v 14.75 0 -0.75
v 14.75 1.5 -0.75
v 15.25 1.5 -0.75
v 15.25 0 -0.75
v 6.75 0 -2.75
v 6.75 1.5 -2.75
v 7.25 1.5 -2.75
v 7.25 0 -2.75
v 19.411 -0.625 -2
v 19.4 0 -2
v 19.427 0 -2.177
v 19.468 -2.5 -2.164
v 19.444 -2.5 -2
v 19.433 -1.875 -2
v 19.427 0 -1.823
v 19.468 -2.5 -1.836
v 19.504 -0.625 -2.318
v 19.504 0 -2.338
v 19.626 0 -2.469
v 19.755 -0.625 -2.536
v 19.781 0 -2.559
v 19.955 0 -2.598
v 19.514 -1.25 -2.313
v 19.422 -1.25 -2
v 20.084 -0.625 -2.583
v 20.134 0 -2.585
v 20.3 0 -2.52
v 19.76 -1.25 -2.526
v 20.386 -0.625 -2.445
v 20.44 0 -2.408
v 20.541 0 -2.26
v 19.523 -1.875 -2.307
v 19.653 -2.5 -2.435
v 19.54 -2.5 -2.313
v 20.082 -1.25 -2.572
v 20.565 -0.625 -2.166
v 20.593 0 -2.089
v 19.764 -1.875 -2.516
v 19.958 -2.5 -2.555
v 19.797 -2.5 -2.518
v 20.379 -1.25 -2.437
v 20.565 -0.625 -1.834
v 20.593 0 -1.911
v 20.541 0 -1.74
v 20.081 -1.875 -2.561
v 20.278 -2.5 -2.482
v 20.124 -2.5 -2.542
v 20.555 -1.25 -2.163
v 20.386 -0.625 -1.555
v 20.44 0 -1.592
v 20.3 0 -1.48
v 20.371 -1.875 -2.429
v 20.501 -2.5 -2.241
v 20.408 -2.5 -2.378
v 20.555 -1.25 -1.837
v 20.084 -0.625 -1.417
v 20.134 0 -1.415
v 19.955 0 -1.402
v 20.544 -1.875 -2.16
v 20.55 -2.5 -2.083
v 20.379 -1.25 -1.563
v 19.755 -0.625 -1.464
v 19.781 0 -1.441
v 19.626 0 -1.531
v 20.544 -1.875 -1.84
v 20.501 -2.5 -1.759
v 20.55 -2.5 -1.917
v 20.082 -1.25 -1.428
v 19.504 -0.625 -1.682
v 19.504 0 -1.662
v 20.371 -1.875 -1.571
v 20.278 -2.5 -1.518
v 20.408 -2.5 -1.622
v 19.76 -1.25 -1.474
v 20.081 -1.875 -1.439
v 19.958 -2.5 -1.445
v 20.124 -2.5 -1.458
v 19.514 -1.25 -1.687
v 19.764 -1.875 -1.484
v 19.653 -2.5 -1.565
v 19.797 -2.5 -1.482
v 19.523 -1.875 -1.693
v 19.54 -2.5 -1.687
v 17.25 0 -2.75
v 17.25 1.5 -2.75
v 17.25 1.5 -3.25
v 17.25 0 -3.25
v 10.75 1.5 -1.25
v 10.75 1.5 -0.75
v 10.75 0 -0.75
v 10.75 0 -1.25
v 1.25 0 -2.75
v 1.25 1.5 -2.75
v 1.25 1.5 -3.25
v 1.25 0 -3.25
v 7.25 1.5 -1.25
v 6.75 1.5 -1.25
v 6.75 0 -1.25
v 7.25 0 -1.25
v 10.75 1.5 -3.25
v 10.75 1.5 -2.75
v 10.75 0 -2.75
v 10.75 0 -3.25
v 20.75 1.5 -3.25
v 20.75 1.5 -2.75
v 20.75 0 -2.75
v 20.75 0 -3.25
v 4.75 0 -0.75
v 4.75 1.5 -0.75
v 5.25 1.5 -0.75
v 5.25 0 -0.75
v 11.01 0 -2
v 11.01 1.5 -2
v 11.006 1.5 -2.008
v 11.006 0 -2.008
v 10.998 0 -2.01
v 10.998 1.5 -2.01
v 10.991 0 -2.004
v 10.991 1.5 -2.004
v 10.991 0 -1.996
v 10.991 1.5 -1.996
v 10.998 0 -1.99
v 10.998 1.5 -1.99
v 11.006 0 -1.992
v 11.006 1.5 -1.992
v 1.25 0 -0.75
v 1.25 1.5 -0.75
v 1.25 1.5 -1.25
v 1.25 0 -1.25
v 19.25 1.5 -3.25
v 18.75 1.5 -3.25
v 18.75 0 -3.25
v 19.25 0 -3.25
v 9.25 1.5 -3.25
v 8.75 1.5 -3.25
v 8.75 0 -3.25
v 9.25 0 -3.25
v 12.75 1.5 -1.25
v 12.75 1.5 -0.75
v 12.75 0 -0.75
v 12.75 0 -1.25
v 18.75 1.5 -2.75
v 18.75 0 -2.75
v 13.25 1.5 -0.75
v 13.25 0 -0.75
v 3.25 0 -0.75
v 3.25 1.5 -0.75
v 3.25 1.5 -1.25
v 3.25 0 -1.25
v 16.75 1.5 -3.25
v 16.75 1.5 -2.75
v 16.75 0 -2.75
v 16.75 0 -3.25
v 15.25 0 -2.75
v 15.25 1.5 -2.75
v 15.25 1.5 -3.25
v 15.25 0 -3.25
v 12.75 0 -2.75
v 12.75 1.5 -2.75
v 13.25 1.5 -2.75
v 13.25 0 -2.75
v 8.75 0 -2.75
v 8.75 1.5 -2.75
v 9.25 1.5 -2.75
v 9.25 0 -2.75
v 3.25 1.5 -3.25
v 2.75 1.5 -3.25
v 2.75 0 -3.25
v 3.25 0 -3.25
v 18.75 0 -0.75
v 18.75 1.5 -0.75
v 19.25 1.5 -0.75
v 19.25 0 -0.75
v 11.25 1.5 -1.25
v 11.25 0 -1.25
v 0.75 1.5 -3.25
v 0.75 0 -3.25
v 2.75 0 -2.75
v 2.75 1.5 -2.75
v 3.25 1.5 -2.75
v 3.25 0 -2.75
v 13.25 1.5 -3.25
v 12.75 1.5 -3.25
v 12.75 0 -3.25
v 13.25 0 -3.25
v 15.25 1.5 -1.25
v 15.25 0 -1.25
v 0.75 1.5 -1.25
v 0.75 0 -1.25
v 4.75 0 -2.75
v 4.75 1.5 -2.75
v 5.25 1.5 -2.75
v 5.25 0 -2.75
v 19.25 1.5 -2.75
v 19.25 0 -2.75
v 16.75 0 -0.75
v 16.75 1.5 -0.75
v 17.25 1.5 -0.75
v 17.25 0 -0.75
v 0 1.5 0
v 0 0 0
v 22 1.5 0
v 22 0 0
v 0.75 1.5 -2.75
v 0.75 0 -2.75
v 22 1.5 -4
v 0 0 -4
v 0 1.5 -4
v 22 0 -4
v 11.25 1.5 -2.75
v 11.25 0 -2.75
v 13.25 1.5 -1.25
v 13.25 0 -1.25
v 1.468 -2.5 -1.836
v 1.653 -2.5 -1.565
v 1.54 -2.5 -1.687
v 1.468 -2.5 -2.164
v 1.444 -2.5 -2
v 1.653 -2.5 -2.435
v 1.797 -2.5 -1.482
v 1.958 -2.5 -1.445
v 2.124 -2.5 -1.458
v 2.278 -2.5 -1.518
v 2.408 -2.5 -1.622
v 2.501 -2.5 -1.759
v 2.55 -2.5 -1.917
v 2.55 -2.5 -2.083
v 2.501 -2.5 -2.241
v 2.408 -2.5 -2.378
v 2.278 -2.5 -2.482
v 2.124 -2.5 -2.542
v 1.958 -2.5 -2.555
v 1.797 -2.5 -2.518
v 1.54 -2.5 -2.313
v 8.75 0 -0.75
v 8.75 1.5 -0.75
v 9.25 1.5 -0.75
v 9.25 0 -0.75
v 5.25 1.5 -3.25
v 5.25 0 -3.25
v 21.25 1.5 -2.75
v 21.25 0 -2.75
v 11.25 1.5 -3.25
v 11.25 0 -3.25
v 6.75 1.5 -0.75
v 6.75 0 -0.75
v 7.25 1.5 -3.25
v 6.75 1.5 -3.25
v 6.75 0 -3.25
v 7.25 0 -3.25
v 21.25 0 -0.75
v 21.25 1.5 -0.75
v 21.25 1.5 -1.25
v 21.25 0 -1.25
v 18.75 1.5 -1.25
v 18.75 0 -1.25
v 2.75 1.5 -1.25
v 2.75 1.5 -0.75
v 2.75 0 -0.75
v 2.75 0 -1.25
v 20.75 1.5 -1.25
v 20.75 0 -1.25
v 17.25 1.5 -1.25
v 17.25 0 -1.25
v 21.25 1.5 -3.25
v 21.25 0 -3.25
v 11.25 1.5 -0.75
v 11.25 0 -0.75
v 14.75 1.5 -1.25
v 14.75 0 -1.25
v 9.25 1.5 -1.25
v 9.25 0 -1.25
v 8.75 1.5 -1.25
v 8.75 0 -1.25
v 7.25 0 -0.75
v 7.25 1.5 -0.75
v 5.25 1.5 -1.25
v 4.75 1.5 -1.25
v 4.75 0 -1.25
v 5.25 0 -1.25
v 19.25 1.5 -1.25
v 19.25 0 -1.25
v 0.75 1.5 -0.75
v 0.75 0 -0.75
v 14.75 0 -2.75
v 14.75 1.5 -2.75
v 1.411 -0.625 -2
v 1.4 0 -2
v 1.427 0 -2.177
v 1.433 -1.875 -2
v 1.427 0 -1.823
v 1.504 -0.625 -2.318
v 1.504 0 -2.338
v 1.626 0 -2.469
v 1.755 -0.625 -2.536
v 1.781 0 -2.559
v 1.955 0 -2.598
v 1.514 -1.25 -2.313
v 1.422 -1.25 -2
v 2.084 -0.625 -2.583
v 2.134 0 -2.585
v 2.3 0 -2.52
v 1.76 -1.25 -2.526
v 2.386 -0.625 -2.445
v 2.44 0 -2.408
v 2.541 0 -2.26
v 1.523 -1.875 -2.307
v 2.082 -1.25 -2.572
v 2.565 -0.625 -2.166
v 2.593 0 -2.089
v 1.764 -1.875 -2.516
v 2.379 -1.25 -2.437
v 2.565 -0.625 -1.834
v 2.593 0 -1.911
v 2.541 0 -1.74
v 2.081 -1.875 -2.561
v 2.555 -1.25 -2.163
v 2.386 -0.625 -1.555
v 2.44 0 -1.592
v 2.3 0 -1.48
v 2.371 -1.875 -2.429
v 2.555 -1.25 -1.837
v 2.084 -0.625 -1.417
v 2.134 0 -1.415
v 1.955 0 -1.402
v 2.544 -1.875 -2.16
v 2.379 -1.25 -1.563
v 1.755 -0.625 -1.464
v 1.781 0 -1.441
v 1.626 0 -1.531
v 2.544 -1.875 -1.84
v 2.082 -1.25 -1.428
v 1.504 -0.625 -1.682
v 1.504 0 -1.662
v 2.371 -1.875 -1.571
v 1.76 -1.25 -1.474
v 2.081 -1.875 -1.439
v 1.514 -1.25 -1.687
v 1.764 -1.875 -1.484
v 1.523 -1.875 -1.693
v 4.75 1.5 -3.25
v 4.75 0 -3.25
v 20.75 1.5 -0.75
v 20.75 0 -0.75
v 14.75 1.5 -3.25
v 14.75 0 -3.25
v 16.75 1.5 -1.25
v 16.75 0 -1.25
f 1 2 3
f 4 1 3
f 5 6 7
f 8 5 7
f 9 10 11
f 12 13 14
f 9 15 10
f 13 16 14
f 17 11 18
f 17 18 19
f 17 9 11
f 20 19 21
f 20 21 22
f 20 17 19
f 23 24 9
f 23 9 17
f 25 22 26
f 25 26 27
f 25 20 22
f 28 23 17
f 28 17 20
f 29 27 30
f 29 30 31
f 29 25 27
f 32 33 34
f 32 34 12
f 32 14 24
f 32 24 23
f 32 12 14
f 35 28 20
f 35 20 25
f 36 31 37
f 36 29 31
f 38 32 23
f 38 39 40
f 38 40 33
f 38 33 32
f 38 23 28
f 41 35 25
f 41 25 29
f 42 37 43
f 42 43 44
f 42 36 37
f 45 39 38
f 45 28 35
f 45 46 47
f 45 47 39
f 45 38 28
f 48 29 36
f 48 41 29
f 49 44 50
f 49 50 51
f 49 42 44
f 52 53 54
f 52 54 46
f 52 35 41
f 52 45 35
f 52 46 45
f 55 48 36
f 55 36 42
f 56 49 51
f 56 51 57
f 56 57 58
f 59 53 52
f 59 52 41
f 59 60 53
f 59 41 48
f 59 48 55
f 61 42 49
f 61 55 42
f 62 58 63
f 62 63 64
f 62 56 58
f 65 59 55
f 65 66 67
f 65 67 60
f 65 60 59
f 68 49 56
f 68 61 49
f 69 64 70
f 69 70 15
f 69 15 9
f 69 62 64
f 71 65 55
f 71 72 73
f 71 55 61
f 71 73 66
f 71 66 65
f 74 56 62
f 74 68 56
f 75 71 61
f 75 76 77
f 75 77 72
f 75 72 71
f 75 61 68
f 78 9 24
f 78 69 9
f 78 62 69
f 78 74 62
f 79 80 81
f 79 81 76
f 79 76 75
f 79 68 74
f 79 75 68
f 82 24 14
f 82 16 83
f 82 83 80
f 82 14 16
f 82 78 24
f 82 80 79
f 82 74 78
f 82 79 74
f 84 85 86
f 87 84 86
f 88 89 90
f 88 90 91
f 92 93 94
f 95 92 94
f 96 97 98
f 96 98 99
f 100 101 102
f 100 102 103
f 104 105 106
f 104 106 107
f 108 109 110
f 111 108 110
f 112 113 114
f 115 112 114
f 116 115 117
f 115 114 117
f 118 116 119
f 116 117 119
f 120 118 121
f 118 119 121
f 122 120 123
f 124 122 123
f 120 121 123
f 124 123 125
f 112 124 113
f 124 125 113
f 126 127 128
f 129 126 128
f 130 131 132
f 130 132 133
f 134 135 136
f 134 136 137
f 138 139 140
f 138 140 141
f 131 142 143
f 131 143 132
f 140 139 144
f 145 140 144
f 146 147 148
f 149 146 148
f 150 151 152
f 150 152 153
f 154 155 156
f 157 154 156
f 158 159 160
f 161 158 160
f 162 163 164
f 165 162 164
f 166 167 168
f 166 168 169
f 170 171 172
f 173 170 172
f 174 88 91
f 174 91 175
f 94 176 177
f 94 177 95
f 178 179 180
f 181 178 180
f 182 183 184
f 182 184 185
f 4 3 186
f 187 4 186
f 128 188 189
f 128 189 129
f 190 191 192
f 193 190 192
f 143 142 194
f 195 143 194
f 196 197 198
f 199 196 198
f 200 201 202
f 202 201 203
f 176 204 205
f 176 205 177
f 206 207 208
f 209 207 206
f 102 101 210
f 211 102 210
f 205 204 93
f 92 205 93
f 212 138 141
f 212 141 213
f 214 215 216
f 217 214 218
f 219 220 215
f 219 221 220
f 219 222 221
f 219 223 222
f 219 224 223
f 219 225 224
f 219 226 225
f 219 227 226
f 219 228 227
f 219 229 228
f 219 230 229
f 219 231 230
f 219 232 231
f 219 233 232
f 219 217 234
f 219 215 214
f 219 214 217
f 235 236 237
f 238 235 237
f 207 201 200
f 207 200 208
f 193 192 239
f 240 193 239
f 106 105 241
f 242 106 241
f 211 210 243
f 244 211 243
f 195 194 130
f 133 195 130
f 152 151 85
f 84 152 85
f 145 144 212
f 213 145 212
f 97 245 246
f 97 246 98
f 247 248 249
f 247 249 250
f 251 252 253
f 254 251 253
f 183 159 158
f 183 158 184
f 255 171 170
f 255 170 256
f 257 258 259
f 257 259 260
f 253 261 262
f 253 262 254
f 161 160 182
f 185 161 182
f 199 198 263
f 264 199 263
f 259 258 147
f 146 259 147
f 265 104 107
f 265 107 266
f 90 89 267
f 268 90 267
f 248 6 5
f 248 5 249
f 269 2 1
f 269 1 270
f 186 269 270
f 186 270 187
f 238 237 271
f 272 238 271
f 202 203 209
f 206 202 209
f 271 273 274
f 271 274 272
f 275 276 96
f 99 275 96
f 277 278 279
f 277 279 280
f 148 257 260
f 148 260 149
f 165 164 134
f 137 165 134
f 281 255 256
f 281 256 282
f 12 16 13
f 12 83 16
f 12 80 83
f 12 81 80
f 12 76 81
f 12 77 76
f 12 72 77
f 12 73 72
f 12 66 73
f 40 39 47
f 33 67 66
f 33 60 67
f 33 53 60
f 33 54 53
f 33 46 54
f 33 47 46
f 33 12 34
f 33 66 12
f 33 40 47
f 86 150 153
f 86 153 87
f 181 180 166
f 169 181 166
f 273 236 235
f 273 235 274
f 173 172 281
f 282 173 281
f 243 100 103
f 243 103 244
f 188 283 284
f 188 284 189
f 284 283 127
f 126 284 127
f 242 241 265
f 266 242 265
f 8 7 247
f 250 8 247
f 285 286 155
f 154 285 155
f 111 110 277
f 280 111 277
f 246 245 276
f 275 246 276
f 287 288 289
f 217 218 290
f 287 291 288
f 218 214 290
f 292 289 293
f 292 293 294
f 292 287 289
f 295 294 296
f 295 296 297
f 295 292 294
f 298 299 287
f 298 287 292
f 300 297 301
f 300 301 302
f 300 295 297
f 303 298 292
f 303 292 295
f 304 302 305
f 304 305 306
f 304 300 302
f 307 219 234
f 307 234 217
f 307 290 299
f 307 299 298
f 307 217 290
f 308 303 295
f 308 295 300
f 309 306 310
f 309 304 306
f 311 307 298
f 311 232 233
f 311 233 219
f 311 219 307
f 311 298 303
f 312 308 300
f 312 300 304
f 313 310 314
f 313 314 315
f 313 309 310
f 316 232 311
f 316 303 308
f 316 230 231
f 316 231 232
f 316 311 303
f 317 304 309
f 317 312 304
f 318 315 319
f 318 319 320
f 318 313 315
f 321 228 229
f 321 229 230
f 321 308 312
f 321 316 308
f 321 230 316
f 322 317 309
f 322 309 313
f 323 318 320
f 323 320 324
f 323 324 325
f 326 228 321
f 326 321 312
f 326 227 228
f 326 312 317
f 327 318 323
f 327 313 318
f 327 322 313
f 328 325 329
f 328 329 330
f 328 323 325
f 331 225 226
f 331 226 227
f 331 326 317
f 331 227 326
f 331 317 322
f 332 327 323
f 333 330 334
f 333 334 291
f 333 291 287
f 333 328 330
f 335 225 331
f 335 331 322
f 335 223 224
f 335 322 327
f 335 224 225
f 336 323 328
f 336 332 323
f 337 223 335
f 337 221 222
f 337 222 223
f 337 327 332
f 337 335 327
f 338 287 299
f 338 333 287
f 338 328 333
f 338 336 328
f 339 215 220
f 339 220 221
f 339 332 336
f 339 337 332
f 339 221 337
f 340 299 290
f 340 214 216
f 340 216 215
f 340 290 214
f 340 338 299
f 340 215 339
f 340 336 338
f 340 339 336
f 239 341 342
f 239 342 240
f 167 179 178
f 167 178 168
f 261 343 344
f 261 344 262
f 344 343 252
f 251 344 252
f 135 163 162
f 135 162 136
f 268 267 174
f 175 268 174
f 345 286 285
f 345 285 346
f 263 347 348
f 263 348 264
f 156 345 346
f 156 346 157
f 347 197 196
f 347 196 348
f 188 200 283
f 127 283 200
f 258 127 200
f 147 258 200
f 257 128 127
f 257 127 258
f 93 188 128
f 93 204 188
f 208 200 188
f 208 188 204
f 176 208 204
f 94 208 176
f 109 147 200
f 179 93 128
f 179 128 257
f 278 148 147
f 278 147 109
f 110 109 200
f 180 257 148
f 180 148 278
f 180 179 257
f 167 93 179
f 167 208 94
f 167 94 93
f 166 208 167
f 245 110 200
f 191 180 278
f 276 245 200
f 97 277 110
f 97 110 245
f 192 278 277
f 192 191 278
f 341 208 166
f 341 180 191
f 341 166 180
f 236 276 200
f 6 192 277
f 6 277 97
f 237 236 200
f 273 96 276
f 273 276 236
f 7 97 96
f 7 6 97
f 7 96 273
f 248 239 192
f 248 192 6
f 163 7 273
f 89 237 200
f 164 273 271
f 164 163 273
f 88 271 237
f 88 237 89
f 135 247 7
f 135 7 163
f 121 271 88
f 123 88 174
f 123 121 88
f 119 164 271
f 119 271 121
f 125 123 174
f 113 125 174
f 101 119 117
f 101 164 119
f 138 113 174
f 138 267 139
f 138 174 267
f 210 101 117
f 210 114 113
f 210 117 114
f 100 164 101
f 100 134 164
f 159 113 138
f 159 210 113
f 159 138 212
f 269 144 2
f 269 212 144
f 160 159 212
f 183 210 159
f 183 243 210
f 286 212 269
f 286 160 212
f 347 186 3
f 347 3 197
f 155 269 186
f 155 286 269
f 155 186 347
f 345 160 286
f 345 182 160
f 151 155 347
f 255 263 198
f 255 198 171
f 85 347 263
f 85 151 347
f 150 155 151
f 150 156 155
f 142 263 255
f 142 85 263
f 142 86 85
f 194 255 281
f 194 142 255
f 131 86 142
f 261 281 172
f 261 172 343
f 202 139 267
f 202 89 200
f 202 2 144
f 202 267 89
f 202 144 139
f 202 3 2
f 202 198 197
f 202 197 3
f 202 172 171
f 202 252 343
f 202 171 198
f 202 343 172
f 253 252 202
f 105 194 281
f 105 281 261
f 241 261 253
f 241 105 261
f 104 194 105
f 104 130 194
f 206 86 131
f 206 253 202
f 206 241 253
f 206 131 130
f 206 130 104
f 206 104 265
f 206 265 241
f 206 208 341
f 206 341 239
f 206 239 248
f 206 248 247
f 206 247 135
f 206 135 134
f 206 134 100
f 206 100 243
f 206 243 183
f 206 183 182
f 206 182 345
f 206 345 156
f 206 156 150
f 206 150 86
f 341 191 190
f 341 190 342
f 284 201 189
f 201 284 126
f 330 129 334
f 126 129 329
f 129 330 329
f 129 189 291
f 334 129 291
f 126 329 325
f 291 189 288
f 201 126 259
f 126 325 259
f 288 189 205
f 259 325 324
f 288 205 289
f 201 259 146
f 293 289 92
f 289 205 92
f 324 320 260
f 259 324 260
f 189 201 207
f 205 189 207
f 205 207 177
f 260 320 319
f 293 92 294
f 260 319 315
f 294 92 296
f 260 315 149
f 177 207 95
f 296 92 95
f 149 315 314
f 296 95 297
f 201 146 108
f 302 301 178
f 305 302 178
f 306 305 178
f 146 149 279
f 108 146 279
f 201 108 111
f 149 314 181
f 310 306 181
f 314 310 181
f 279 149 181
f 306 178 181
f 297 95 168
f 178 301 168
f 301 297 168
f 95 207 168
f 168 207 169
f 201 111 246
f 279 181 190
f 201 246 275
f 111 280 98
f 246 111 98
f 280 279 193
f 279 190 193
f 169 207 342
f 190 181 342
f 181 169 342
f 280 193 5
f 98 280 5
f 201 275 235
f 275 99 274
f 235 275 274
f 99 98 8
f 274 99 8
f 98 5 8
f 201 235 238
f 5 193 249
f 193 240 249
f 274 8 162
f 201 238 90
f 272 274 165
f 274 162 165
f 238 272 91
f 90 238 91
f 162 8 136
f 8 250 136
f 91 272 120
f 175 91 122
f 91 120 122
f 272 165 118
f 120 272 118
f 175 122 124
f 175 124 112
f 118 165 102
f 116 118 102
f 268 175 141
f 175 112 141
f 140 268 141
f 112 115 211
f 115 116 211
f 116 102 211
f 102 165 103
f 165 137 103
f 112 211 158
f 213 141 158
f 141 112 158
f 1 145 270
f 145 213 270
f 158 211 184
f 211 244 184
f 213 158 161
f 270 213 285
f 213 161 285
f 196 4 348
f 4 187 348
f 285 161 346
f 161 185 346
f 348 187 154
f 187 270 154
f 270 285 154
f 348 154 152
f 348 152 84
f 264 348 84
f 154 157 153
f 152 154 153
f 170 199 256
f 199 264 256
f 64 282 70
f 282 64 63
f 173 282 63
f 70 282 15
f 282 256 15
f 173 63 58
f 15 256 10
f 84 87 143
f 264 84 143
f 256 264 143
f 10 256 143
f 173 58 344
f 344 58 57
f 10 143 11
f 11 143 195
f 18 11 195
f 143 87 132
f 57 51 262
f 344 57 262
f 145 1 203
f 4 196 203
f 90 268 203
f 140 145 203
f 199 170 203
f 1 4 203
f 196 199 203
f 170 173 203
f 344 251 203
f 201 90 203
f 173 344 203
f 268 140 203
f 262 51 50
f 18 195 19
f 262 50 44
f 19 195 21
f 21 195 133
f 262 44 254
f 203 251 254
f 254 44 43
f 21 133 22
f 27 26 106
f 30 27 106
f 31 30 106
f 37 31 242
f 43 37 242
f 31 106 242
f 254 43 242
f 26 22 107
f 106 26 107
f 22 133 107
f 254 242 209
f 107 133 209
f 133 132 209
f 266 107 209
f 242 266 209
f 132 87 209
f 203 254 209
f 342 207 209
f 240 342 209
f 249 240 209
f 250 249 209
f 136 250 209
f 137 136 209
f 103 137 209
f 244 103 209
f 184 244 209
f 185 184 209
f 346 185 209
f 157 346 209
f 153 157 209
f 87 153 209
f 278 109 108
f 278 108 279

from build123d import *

# Parameters (mm, degrees)
SKETCH1_W                     = 22
SKETCH1_H                     = 4
BOSS_EXTRUDE1_DEPTH           = 1.5
SKETCH2_W                     = 0.5
SKETCH2_H                     = 0.5
CUT_EXTRUDE1_DEPTH            = 2
SKETCH3_R                     = 0.01
CUT_EXTRUDE2_DEPTH            = 1.5
SKETCH4_R                     = 0.6
BOSS_EXTRUDE2_DEPTH           = 2.5
BOSS_EXTRUDE2_DRAFT           = 1
BOSS_EXTRUDE2_PROFILE_2_DEPTH = 2.5
BOSS_EXTRUDE2_PROFILE_2_DRAFT = 1


with BuildPart() as part:
    # Sketch1 → Boss-Extrude1 (new body)
    with BuildSketch(Plane(origin=(0, 0, 0), x_dir=(1, 0, 0), z_dir=(0, 1, 0))):
        with Locations((11, 2)):
            Rectangle(SKETCH1_W, SKETCH1_H)
    extrude(amount=BOSS_EXTRUDE1_DEPTH)

    # Sketch2 → Cut-Extrude1 (cut)
    with BuildSketch(Plane(origin=(0, 1.5, 0), x_dir=(1, 0, 0), z_dir=(0, 1, 0))):
        with Locations((3, 3)):
            Rectangle(SKETCH2_W, SKETCH2_H)
        with Locations((1, 3)):
            Rectangle(SKETCH2_W, SKETCH2_H)
        with Locations((5, 3)):
            Rectangle(SKETCH2_W, SKETCH2_H)
        with Locations((7, 3)):
            Rectangle(SKETCH2_W, SKETCH2_H)
        with Locations((9, 3)):
            Rectangle(SKETCH2_W, SKETCH2_H)
        with Locations((11, 3)):
            Rectangle(SKETCH2_W, SKETCH2_H)
        with Locations((13, 3)):
            Rectangle(SKETCH2_W, SKETCH2_H)
        with Locations((15, 3)):
            Rectangle(SKETCH2_W, SKETCH2_H)
        with Locations((17, 3)):
            Rectangle(SKETCH2_W, SKETCH2_H)
        with Locations((19, 3)):
            Rectangle(SKETCH2_W, SKETCH2_H)
        with Locations((21, 3)):
            Rectangle(SKETCH2_W, SKETCH2_H)
        with Locations((1, 1)):
            Rectangle(SKETCH2_W, SKETCH2_H)
        with Locations((3, 1)):
            Rectangle(SKETCH2_W, SKETCH2_H)
        with Locations((5, 1)):
            Rectangle(SKETCH2_W, SKETCH2_H)
        with Locations((7, 1)):
            Rectangle(SKETCH2_W, SKETCH2_H)
        with Locations((9, 1)):
            Rectangle(SKETCH2_W, SKETCH2_H)
        with Locations((11, 1)):
            Rectangle(SKETCH2_W, SKETCH2_H)
        with Locations((13, 1)):
            Rectangle(SKETCH2_W, SKETCH2_H)
        with Locations((15, 1)):
            Rectangle(SKETCH2_W, SKETCH2_H)
        with Locations((17, 1)):
            Rectangle(SKETCH2_W, SKETCH2_H)
        with Locations((19, 1)):
            Rectangle(SKETCH2_W, SKETCH2_H)
        with Locations((21, 1)):
            Rectangle(SKETCH2_W, SKETCH2_H)
    extrude(amount=-CUT_EXTRUDE1_DEPTH, mode=Mode.SUBTRACT)

    # Sketch3 → Cut-Extrude2 (cut)
    with BuildSketch(Plane(origin=(0, 1.5, 0), x_dir=(1, 0, 0), z_dir=(0, 1, 0))):
        with Locations((11, 2)):
            Circle(SKETCH3_R)
    extrude(amount=-CUT_EXTRUDE2_DEPTH, mode=Mode.SUBTRACT)


with BuildPart() as boss_extrude2_tool:
    # Sketch4 → Boss-Extrude2 (with draft: the straight prism first)
    with BuildSketch(Plane(origin=(0, 0, 0), x_dir=(-1, 0, 0), z_dir=(0, -1, 0))):
        with Locations((-20, 2)):
            Circle(SKETCH4_R)
    extrude(amount=BOSS_EXTRUDE2_DEPTH)
    # Boss-Extrude2: the draft: its side faces are tilted about the plane it starts from
    boss_extrude2_sides = [boss_extrude2_tool.faces().sort_by_distance(p)[0] for p in [
        (20.6, -1.25, -2),
    ]]
    draft(boss_extrude2_sides, Plane(origin=(0, 0, 0), x_dir=(-1, 0, 0), z_dir=(0, -1, 0)), BOSS_EXTRUDE2_DRAFT)


with BuildPart() as part_1:
    add(part.part)

    # Boss-Extrude2: add boss_extrude2_tool
    add(boss_extrude2_tool.part)


with BuildPart() as boss_extrude2_profile_2_tool:
    # Sketch4 → Boss-Extrude2 profile 2 (with draft: the straight prism first)
    with BuildSketch(Plane(origin=(0, 0, 0), x_dir=(-1, 0, 0), z_dir=(0, -1, 0))):
        with Locations((-2, 2)):
            Circle(SKETCH4_R)
    extrude(amount=BOSS_EXTRUDE2_PROFILE_2_DEPTH)
    # Boss-Extrude2 profile 2: the draft: its side faces are tilted about the plane it starts from
    boss_extrude2_profile_2_sides = [boss_extrude2_profile_2_tool.faces().sort_by_distance(p)[0] for p in [
        (2.6, -1.25, -2),
    ]]
    draft(boss_extrude2_profile_2_sides, Plane(origin=(0, 0, 0), x_dir=(-1, 0, 0), z_dir=(0, -1, 0)), BOSS_EXTRUDE2_PROFILE_2_DRAFT)


with BuildPart() as part_2:
    add(part_1.part)

    # Boss-Extrude2 profile 2: add boss_extrude2_profile_2_tool
    add(boss_extrude2_profile_2_tool.part)


solid = part_2.part
